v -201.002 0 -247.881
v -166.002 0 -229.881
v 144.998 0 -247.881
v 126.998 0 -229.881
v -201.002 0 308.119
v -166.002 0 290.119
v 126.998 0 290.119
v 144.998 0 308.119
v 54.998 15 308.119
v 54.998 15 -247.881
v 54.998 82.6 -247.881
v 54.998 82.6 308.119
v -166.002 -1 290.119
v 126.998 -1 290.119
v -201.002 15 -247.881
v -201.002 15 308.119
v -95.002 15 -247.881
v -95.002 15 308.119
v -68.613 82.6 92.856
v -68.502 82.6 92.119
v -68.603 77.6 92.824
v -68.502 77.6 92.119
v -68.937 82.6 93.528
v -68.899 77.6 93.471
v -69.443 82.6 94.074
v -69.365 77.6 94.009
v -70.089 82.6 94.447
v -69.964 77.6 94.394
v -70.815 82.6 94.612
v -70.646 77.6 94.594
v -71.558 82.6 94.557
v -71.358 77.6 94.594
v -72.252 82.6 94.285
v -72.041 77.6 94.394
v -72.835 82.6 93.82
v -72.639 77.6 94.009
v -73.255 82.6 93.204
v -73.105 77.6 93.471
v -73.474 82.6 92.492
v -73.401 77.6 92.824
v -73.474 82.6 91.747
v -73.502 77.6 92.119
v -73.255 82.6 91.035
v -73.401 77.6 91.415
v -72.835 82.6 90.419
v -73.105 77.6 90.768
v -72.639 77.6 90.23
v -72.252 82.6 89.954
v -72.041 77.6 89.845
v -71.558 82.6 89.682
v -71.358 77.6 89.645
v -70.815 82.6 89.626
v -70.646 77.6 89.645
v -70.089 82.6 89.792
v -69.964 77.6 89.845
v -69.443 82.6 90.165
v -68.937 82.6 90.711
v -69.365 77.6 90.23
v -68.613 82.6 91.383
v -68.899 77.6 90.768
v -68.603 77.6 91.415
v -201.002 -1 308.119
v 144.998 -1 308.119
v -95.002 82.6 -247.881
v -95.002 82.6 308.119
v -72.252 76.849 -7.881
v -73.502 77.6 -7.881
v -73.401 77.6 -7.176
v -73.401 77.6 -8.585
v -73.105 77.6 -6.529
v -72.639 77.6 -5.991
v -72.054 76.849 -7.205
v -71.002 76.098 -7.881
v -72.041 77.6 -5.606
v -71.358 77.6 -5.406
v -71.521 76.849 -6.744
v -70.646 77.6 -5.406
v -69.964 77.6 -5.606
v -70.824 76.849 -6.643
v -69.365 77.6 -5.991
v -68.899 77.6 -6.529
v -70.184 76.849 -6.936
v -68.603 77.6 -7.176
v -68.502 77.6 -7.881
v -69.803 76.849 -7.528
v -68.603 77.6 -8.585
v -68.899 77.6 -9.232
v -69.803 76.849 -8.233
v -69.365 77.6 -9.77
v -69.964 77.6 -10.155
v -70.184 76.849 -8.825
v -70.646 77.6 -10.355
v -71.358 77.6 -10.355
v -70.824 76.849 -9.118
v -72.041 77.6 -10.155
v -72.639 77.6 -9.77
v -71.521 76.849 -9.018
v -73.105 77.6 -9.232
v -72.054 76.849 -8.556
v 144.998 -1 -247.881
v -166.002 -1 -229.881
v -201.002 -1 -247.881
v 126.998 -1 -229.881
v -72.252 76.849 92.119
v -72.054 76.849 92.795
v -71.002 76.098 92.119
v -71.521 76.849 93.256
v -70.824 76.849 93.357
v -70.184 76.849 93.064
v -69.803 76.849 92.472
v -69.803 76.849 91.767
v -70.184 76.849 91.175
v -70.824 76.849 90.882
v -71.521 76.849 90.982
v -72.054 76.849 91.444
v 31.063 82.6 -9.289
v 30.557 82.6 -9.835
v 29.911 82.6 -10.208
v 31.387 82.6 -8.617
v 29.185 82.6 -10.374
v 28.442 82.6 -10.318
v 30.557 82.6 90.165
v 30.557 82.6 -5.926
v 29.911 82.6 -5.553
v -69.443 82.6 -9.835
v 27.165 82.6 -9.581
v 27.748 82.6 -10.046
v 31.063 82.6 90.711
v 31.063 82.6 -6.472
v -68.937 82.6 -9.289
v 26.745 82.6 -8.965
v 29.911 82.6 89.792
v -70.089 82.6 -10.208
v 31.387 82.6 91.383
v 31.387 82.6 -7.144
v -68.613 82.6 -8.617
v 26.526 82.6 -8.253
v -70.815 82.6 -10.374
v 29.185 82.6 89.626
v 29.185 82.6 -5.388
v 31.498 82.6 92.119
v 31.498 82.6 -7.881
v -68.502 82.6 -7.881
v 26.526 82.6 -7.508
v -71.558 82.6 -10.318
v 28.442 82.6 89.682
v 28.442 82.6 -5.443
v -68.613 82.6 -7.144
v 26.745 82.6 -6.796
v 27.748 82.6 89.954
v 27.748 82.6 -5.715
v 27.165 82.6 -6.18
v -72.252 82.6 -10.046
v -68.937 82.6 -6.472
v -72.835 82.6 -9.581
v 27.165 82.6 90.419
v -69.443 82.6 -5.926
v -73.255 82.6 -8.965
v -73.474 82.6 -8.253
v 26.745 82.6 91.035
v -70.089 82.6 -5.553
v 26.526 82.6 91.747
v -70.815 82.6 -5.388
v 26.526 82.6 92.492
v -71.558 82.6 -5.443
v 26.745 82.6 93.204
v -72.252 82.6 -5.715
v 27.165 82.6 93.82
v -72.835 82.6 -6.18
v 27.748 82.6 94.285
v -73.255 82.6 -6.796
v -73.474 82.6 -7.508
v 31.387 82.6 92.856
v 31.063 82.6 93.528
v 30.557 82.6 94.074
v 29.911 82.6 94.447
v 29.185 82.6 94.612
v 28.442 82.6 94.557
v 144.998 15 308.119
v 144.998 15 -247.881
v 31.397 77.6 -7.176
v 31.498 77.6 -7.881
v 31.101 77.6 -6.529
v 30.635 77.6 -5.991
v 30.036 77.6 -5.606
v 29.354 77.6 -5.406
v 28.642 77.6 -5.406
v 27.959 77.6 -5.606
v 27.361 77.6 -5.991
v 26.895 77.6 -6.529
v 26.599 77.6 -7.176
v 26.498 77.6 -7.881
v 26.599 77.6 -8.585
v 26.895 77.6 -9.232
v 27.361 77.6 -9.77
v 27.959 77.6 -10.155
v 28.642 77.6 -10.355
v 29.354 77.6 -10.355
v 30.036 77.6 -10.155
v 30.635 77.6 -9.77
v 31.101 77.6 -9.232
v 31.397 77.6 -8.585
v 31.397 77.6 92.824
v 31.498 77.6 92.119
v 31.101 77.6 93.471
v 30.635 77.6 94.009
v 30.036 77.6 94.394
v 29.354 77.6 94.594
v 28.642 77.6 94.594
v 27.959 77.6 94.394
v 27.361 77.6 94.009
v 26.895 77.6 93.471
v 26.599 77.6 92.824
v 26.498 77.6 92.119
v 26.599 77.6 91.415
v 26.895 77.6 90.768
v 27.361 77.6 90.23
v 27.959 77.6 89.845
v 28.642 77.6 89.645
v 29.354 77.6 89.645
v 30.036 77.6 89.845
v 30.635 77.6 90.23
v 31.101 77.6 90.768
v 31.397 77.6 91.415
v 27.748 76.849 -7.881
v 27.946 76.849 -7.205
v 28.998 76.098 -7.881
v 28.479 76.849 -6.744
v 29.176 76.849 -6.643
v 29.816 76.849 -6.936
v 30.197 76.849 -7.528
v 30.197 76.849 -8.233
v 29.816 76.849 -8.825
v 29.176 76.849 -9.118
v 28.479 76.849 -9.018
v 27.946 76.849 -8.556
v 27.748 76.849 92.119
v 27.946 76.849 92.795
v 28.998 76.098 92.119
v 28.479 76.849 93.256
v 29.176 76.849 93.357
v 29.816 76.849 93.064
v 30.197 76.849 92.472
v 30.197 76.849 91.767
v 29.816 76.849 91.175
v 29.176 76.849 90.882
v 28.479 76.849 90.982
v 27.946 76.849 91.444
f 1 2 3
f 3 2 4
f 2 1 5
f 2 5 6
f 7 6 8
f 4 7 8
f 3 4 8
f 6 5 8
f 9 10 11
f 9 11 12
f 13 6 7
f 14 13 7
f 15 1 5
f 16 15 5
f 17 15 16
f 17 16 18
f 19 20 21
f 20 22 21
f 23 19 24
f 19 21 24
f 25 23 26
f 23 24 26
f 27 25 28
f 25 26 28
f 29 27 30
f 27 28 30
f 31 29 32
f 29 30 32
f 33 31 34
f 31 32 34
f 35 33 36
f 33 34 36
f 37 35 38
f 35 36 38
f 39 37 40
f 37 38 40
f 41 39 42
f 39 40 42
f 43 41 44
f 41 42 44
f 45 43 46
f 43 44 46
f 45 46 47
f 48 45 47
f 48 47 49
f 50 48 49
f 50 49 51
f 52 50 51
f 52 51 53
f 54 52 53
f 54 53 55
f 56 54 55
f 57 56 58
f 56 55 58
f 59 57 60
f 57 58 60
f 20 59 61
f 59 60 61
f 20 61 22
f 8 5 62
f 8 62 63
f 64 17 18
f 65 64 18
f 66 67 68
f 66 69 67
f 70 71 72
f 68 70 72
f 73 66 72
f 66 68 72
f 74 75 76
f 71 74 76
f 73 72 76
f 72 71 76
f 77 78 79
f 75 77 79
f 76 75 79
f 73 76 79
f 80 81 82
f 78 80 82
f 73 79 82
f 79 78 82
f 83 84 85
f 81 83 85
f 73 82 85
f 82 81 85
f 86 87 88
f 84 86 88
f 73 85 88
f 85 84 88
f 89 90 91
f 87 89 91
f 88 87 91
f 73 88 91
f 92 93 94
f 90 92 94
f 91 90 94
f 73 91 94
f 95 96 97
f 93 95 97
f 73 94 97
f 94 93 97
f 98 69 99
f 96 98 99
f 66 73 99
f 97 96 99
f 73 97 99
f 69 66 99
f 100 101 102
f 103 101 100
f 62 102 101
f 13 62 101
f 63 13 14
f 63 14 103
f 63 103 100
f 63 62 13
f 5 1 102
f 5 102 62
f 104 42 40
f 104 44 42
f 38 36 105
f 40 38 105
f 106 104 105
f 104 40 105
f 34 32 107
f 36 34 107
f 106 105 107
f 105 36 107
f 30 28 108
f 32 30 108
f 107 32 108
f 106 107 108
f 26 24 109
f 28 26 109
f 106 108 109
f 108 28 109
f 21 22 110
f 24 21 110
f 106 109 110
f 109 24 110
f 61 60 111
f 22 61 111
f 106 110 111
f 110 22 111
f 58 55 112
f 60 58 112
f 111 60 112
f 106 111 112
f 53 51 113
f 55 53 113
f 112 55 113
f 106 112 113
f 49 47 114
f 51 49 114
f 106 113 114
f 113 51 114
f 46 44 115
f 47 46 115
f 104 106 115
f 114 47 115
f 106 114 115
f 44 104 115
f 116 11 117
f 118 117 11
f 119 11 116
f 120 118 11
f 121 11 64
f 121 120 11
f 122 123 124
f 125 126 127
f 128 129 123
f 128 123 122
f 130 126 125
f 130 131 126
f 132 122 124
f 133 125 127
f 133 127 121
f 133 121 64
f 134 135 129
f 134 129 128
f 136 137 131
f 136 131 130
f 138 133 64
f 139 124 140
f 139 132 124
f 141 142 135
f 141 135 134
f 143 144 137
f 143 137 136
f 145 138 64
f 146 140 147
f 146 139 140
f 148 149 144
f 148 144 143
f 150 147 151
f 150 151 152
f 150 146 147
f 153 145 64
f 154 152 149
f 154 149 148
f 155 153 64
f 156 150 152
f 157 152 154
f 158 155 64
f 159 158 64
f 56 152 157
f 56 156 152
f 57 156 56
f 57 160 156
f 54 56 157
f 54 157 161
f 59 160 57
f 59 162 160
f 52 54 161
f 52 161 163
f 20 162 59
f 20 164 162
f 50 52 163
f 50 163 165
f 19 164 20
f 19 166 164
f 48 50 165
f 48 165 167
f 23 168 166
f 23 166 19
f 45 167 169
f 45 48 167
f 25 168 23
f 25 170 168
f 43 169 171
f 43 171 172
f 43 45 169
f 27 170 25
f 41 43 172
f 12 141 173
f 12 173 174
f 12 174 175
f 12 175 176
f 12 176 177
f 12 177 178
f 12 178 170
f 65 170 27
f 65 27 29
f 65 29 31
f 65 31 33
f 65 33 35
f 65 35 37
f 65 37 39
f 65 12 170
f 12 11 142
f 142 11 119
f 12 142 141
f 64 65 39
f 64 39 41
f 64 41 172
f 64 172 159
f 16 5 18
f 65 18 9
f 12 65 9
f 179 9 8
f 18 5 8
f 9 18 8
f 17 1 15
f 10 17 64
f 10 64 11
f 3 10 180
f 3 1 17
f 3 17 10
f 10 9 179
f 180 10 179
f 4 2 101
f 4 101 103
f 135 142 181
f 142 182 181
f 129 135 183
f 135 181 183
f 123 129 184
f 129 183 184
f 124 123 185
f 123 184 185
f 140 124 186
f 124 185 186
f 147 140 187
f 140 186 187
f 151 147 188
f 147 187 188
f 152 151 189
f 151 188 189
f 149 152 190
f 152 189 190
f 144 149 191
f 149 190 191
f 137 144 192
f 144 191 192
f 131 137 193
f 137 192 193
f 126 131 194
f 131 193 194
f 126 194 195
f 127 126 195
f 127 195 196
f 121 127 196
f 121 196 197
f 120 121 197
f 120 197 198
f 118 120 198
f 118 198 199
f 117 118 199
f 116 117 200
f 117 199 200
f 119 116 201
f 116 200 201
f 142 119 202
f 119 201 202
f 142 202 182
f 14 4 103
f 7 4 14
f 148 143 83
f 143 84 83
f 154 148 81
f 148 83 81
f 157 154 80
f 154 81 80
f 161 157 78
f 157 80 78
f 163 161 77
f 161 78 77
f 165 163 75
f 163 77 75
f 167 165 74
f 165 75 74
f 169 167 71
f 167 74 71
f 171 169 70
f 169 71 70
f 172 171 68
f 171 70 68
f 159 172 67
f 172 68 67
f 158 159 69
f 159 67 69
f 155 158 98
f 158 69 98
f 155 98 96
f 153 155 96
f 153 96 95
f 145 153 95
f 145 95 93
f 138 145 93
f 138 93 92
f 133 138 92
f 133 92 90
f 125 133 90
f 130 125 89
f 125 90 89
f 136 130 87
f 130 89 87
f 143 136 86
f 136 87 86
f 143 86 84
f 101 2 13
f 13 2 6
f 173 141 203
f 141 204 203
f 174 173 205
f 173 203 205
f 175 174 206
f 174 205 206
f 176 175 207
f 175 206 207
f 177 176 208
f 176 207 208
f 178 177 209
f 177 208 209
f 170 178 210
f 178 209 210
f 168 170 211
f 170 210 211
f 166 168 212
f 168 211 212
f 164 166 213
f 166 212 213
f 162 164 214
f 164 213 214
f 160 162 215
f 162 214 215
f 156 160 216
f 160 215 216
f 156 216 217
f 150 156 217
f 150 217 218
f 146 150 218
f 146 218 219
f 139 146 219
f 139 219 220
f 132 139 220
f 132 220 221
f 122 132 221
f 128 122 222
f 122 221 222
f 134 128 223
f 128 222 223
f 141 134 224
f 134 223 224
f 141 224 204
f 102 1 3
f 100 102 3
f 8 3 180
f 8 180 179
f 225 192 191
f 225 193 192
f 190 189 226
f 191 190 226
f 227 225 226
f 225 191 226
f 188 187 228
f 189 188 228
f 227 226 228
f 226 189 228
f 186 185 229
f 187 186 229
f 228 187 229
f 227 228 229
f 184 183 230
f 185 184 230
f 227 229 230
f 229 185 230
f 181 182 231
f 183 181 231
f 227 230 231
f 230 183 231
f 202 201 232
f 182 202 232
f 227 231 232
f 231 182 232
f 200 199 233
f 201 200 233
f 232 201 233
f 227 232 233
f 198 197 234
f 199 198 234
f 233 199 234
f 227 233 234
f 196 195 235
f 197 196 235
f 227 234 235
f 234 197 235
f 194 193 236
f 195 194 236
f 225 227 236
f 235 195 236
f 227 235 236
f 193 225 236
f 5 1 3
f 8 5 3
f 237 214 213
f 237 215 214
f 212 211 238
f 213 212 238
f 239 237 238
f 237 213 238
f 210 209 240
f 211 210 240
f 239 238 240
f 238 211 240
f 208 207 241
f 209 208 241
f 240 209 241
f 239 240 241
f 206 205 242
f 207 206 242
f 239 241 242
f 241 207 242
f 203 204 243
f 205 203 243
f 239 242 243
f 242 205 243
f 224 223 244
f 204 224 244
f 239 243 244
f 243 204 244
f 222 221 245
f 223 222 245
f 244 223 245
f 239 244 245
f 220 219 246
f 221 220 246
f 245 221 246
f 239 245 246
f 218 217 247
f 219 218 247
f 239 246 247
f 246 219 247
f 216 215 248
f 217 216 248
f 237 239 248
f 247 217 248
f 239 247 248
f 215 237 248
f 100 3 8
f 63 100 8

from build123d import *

# Parameters (mm, degrees)
F2_W     = 346
F2_H     = 556
F3_DEPTH = 15
F4_W     = 150
F4_H     = 556
F5_DEPTH = 67.6
F7_D     = 5
F7_DEPTH = 5
F7_TIP   = 1.5021515476
F8_W     = 346
F8_H     = 556
F8_W_2   = 293
F8_H_2   = 520
F9_DEPTH = 1


with BuildPart() as f3:
    # F2 (on Front) → F3 (new body)
    with BuildSketch(Plane.XZ):
        with Locations((-28.0021212956, 30.1194461733)):
            Rectangle(F2_W, F2_H)
    extrude(amount=-F3_DEPTH)

    # F4 (on face) → F5 (join)
    with BuildSketch(Plane(origin=(0, 15, 0), x_dir=(-1, 0, 0), z_dir=(0, 1, 0))):
        with Locations((20.0021212956, 30.1194461733)):
            Rectangle(F4_W, F4_H)
    extrude(amount=F5_DEPTH)

    # F7
    with Locations(Plane(origin=(0, 82.6, 0), x_dir=(-1, 0, 0), z_dir=(0, 1, 0))):
        with Locations((-28.9978787044, 92.1194461733), (71.0021212956, 92.1194461733), (71.0021212956, -7.8805538267), (-28.9978787044, -7.8805538267)):
            Hole(F7_D / 2, depth=F7_DEPTH)
            with Locations((0, 0, -(F7_DEPTH + F7_TIP / 2))):  # 118° drill point
                Cone(0, F7_D / 2, F7_TIP, mode=Mode.SUBTRACT)


with BuildPart() as f9:
    # F8 (on face) → F9 (new body)
    with BuildSketch(Plane.XZ):
        with Locations((-28.0021212956, 30.1194461733)):
            Rectangle(F8_W, F8_H)
        with Locations((-19.5021212956, 30.1194461733)):
            Rectangle(F8_W_2, F8_H_2, mode=Mode.SUBTRACT)
    extrude(amount=F9_DEPTH)


solid = Compound([f3.part, f9.part])
